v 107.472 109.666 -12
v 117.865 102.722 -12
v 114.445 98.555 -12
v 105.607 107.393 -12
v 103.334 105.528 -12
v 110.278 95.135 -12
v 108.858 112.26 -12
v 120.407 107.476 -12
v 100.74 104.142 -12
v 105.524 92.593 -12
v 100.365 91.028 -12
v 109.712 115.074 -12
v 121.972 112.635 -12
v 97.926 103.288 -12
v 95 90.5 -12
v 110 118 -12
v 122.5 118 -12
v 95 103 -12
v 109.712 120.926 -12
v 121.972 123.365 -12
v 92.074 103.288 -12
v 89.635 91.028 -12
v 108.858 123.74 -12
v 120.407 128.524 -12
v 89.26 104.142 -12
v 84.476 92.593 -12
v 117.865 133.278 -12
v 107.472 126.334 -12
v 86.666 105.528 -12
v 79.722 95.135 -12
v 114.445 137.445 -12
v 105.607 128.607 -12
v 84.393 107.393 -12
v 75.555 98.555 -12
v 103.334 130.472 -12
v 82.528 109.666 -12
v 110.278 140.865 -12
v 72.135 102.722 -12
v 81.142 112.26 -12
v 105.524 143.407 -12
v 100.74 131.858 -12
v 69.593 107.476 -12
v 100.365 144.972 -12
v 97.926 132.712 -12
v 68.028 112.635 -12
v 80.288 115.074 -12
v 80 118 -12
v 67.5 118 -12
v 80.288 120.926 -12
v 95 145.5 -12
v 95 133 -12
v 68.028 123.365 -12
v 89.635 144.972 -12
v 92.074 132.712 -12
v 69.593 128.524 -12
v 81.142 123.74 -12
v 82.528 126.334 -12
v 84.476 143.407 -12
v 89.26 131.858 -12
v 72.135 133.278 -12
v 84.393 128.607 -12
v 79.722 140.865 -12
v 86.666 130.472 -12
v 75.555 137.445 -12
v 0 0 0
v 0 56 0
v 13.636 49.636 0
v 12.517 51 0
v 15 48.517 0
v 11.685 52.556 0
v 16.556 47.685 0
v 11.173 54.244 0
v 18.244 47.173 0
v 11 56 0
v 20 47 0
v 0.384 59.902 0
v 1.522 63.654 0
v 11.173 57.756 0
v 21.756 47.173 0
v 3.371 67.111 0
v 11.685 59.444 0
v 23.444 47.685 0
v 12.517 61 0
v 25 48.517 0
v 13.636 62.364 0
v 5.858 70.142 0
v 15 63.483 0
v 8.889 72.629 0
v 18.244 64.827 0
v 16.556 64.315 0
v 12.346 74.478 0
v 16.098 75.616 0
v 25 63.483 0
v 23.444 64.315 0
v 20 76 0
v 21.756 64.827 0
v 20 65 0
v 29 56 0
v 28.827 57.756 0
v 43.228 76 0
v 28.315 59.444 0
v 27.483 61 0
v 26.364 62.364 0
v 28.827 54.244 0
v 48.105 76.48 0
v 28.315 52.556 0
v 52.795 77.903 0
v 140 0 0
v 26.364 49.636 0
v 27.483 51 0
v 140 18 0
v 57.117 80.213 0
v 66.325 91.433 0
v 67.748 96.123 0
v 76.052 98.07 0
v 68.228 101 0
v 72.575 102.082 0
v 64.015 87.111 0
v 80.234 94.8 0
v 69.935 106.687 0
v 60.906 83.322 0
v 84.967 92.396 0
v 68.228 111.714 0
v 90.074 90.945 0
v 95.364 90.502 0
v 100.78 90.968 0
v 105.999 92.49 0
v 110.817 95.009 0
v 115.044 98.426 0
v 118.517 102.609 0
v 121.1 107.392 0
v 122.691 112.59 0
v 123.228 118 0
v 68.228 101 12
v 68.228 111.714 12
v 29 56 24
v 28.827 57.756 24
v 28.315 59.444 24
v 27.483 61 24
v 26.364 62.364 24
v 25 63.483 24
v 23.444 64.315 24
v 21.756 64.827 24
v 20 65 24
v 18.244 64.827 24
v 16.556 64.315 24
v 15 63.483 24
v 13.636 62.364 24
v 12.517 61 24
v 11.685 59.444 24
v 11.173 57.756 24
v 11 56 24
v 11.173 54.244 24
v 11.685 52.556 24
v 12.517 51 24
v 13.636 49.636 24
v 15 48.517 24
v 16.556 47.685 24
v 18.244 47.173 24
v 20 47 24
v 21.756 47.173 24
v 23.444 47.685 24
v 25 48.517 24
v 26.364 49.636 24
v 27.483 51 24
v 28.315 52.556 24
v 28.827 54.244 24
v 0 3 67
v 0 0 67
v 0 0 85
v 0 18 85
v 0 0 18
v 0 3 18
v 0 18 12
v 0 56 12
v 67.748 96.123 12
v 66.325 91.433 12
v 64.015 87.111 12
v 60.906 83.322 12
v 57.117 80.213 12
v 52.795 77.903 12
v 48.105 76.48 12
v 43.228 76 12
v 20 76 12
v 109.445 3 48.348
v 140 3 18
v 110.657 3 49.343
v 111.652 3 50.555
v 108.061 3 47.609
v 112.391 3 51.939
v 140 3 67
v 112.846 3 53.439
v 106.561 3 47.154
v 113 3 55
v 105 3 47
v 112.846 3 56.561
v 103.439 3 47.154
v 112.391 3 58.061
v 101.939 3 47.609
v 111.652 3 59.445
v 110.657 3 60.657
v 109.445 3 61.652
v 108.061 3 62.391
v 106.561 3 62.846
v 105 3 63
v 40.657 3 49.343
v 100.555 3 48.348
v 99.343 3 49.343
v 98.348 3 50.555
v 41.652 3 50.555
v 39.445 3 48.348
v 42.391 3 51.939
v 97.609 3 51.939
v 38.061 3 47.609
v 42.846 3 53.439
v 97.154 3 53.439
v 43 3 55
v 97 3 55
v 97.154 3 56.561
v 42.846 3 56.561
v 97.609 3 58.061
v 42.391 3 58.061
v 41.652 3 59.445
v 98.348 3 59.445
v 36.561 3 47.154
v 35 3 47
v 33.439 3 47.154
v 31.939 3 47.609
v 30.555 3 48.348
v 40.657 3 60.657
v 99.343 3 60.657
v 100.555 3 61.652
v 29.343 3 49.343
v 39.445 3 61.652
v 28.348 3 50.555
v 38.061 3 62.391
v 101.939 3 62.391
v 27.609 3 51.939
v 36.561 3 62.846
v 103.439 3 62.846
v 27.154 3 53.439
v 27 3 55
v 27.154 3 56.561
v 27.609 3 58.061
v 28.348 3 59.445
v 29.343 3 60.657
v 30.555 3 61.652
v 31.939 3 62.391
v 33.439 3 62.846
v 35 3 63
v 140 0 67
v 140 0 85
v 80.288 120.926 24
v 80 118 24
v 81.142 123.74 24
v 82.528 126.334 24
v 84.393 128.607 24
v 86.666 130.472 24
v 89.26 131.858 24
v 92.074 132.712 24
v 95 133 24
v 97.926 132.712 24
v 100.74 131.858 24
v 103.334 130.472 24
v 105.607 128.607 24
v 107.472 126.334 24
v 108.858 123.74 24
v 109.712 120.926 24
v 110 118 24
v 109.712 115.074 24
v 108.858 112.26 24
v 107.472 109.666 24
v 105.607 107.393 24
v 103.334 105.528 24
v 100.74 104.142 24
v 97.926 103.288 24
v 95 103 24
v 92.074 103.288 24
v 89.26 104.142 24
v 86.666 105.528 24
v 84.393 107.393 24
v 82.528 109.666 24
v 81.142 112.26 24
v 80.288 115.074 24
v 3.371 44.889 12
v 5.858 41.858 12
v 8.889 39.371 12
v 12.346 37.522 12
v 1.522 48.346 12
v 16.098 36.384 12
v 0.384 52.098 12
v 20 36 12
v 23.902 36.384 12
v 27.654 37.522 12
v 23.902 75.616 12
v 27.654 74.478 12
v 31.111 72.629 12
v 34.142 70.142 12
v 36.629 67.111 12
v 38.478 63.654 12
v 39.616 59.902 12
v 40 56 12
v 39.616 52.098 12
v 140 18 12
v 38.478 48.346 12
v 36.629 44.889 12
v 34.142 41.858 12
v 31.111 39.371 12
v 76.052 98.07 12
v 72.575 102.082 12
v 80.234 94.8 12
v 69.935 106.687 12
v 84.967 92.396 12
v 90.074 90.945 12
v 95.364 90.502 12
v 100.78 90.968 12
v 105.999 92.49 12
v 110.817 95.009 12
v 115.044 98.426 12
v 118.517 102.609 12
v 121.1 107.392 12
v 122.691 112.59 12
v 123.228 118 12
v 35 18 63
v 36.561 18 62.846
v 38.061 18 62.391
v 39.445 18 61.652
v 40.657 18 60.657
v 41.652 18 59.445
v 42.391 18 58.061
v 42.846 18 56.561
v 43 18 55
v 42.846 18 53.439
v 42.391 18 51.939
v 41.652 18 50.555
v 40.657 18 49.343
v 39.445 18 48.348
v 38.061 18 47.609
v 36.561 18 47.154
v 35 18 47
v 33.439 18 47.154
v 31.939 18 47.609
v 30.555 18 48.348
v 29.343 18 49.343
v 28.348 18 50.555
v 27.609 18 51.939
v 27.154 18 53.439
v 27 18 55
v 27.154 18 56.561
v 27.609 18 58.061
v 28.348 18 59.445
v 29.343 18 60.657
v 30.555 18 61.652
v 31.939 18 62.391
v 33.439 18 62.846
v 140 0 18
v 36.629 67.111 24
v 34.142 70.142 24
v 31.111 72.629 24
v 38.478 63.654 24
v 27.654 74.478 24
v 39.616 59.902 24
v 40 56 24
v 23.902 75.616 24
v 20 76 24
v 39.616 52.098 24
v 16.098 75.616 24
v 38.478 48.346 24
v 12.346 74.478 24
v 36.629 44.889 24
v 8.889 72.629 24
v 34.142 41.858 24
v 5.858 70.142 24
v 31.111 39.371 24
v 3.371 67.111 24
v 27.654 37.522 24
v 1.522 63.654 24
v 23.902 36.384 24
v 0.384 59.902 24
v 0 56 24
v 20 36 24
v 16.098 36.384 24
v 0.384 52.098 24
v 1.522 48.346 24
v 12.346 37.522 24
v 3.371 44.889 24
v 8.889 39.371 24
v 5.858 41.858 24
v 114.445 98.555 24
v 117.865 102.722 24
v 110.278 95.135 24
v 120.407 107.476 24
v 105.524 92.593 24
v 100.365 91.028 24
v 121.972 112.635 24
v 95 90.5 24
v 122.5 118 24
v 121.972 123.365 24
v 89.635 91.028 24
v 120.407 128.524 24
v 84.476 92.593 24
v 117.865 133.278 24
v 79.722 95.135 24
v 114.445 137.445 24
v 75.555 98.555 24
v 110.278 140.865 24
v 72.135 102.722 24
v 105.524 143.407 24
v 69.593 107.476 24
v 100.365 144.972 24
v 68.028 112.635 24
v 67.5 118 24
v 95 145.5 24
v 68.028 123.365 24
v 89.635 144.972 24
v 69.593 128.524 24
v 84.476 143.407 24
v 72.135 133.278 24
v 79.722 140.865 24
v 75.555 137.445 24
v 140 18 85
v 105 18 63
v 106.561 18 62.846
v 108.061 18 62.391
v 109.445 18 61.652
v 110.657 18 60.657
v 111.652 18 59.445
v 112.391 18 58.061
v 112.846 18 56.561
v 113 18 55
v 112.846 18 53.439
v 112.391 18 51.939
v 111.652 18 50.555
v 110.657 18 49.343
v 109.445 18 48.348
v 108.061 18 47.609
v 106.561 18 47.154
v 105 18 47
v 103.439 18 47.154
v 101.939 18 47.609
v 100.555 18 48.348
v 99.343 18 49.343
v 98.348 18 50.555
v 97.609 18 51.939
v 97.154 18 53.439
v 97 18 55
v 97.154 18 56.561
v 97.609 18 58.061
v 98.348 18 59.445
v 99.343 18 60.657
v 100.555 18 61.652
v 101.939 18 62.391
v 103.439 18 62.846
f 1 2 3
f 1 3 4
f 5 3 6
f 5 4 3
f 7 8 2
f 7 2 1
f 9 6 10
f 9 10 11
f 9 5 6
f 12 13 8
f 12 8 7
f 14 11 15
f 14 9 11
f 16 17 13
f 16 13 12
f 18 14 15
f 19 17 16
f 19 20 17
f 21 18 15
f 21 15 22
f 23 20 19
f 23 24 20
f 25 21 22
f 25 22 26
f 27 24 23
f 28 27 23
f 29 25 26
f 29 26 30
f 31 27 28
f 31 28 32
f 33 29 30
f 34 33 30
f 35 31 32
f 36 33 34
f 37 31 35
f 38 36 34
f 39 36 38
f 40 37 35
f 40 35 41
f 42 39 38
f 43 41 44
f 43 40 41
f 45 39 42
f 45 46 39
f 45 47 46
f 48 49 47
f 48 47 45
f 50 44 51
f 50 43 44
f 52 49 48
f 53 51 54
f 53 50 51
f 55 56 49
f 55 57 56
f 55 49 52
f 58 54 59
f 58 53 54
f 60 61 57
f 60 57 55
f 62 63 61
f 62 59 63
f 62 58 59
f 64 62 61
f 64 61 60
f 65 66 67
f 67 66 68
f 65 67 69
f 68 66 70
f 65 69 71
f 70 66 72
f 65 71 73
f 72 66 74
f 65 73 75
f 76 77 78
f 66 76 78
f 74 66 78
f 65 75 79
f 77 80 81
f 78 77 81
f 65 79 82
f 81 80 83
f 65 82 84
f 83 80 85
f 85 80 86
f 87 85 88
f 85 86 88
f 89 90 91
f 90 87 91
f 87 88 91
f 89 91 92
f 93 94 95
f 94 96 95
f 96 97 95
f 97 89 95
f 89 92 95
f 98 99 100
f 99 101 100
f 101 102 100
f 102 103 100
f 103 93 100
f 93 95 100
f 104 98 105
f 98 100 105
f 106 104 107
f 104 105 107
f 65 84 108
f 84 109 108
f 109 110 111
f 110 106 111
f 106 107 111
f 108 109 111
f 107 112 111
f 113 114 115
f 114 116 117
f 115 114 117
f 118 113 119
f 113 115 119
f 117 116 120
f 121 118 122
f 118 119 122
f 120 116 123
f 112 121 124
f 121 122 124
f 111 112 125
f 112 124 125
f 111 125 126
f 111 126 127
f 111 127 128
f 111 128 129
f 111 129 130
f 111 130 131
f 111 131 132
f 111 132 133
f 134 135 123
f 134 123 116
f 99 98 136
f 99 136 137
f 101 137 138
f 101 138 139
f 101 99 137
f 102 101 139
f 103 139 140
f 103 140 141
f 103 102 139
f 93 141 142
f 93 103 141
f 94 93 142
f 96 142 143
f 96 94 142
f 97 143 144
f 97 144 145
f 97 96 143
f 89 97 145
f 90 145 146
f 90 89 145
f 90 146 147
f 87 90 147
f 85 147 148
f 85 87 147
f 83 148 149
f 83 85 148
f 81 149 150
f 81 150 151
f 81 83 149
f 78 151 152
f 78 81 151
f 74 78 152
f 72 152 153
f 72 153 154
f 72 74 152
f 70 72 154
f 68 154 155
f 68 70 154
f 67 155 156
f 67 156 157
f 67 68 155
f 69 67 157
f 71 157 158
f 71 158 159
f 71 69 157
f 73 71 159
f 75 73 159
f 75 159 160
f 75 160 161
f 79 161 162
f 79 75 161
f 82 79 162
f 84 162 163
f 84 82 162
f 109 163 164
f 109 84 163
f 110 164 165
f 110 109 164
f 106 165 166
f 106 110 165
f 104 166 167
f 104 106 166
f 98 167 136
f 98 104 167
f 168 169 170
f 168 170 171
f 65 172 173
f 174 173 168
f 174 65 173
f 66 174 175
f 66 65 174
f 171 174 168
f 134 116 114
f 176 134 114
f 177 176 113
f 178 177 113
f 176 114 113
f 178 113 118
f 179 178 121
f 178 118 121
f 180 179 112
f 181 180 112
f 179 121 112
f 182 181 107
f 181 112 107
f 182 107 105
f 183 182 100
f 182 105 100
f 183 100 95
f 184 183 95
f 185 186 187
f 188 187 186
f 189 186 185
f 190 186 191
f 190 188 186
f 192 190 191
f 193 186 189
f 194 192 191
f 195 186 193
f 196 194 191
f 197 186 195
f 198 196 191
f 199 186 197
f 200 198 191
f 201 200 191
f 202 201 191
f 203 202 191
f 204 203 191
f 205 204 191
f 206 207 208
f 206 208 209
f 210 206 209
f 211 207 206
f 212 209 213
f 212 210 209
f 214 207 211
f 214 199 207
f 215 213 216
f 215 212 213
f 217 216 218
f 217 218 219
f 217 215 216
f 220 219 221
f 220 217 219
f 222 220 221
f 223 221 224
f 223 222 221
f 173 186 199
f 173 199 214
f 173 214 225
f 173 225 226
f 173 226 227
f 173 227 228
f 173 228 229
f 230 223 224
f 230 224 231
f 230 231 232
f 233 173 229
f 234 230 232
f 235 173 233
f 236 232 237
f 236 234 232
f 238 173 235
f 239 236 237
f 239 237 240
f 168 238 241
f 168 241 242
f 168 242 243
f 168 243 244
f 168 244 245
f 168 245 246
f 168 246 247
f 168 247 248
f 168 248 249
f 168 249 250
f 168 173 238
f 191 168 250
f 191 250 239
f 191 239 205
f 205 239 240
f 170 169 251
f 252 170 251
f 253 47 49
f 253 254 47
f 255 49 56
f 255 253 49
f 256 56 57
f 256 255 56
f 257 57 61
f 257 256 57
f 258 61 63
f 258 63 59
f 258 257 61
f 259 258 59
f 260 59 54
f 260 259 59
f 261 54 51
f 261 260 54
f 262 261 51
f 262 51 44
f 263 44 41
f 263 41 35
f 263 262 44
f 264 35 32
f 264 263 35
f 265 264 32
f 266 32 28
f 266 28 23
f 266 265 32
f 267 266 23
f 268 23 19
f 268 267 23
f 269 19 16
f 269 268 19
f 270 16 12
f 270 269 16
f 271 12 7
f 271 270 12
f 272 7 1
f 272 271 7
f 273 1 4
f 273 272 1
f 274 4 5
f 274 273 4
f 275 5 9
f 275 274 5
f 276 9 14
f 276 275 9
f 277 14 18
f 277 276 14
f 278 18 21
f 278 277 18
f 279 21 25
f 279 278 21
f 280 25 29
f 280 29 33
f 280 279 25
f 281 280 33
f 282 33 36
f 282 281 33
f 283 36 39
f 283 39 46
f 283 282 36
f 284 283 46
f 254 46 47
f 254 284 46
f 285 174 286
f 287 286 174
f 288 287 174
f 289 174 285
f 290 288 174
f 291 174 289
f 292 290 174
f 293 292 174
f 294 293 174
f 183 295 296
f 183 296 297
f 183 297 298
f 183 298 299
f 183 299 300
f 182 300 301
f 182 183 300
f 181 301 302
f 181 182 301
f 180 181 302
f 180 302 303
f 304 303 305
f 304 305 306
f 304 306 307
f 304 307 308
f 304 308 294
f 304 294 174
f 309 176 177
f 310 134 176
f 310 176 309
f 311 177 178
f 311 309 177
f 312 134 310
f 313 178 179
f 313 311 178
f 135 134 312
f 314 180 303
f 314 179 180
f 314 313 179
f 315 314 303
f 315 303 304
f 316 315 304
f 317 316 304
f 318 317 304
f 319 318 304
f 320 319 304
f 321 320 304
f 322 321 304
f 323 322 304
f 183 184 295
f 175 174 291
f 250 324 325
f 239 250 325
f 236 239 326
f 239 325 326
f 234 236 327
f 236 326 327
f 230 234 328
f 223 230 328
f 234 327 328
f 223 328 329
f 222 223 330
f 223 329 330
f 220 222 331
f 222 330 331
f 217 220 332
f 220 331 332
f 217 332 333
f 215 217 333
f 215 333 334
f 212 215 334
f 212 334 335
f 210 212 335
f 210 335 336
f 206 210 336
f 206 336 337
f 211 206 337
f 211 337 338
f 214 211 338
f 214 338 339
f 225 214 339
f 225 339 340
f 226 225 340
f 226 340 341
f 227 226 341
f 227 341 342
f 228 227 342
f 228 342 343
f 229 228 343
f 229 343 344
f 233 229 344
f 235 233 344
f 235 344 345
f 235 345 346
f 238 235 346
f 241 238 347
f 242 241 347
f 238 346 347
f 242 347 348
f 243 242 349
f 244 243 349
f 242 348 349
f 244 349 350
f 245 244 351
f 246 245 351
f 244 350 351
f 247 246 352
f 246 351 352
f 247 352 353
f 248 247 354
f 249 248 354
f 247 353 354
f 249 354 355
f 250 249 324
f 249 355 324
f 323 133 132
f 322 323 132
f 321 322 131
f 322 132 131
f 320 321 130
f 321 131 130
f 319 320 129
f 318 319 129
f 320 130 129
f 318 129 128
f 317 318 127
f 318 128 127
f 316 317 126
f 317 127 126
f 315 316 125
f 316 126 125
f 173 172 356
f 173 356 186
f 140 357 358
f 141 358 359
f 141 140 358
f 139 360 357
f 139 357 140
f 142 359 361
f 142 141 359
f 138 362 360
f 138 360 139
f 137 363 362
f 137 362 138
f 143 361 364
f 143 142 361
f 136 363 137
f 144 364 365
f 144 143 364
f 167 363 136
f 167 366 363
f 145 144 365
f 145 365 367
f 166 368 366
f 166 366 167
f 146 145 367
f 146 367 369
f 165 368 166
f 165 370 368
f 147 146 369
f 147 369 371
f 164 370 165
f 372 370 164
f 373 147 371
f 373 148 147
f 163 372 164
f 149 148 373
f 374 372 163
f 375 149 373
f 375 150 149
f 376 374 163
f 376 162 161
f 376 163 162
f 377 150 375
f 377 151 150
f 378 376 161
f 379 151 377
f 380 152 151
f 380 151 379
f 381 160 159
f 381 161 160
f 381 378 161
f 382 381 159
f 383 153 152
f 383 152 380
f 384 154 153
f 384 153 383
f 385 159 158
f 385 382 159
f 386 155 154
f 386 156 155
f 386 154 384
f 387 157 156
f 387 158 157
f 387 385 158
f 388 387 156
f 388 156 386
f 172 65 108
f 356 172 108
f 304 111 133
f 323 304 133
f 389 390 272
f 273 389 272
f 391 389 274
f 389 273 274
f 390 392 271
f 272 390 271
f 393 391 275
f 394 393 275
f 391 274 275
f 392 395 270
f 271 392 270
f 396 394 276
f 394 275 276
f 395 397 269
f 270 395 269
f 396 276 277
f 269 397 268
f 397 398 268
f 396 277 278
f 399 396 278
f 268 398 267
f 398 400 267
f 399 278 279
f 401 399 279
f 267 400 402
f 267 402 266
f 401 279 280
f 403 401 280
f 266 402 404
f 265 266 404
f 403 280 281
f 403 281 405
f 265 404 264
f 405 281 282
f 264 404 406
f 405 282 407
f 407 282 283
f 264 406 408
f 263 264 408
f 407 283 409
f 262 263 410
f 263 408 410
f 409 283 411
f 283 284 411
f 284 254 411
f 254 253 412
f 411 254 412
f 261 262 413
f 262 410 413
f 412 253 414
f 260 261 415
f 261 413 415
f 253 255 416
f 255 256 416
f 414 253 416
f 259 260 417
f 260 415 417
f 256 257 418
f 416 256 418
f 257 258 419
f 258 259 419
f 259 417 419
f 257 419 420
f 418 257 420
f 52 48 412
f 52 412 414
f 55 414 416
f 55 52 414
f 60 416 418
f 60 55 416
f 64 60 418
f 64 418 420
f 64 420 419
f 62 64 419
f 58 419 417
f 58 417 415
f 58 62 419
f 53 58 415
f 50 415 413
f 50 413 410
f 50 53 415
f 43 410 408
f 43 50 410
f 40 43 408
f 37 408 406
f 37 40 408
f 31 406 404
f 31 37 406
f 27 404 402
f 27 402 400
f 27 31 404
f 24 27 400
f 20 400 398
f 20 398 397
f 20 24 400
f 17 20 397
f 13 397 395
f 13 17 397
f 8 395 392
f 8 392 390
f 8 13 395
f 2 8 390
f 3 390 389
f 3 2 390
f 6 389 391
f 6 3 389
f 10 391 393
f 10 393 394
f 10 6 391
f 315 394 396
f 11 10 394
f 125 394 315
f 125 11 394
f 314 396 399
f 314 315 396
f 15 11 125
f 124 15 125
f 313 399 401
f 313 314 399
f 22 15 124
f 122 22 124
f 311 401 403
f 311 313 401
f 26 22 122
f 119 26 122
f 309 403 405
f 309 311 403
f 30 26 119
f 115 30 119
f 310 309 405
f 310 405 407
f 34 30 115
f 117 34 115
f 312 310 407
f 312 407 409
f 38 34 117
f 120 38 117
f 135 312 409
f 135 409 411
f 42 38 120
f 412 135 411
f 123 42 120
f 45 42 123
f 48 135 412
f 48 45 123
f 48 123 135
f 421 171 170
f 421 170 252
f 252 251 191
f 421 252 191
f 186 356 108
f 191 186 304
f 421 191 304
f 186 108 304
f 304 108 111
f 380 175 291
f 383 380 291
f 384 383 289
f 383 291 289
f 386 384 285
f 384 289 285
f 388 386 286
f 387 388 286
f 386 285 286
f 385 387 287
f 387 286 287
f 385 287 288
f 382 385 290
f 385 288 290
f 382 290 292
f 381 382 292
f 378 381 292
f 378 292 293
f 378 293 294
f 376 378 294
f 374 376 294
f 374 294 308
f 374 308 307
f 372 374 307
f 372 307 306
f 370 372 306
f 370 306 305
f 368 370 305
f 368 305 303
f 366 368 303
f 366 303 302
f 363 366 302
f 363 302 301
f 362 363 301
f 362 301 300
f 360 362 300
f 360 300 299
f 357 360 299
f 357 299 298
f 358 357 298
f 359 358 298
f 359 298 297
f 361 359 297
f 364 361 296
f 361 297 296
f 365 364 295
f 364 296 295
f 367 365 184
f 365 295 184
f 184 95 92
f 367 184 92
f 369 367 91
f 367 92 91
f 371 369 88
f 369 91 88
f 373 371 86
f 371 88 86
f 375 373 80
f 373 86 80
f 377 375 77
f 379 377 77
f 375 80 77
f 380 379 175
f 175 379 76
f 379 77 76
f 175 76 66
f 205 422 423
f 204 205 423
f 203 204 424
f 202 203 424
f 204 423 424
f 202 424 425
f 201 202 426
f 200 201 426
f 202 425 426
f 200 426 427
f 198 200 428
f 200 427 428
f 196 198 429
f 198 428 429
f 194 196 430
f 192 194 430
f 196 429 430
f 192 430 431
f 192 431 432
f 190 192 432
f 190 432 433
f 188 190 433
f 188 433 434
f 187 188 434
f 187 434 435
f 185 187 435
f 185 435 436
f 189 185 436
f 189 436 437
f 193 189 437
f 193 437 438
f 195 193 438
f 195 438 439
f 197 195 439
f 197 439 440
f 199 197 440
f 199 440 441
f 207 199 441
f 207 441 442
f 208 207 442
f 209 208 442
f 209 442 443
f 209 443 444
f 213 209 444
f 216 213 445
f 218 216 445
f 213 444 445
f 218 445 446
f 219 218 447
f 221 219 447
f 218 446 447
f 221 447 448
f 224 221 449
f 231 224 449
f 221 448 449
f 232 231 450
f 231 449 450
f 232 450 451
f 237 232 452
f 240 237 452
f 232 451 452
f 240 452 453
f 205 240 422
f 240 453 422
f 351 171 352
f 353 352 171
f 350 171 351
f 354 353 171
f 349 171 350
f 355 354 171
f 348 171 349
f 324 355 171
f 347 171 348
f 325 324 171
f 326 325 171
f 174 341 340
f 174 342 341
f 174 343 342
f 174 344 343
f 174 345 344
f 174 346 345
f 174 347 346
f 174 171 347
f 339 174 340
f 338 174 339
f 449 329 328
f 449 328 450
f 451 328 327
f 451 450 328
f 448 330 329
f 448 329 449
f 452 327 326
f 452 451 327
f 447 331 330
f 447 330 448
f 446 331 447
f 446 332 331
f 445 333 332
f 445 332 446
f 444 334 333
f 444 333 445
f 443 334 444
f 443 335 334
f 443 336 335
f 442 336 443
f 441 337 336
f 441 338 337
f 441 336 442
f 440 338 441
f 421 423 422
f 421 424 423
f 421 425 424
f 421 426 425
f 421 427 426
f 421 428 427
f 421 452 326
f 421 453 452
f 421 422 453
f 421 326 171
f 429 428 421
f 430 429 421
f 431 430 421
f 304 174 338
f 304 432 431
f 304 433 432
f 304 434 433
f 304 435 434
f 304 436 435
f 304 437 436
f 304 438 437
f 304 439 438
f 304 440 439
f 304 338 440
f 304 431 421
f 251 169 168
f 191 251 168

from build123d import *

# Parameters (mm, degrees)
BOSS_EXTRUDE1_DEPTH = 12
SKETCH1_3_R         = 9
BOSS_EXTRUDE2_DEPTH = 24
SKETCH1_4_W         = 140
SKETCH1_4_H         = 18
BOSS_EXTRUDE3_DEPTH = 85
SKETCH2_R           = 27.5
SKETCH2_R_2         = 15
BOSS_EXTRUDE4_DEPTH = 18
SKETCH3_R           = 8
CUT_EXTRUDE1_DEPTH  = 208.560232222
SKETCH5_W           = 49
SKETCH5_H           = 3
CUT_EXTRUDE2_DEPTH  = 220.078182392


with BuildPart() as part:
    # Sketch1 → Boss-Extrude1 (new body)
    with BuildSketch(Plane.XY):
        with BuildLine():
            Line((140, 18), (123.22800697, 118))
            ThreePointArc((123.22800697, 118), (95.72800697, 90.5), (68.22800697, 118))
            Line((68.22800697, 118), (68.22800697, 101))
            ThreePointArc((68.22800697, 101), (60.9056765, 83.32233047), (43.22800697, 76))
            Line((43.22800697, 76), (20, 76))
            ThreePointArc((20, 76), (34.142135624, 70.142135624), (40, 56))
            ThreePointArc((40, 56), (20, 36), (0, 56))
            Line((0, 56), (0, 18))
            Line((0, 18), (140, 18))
        make_face()
    extrude(amount=BOSS_EXTRUDE1_DEPTH)

    # Sketch1<3> → Boss-Extrude2 (add)
    with BuildSketch(Plane.XY):
        with BuildLine():
            ThreePointArc((20, 76), (5.857864376, 70.142135624), (0, 56))
            ThreePointArc((0, 56), (20, 36), (40, 56))
            ThreePointArc((40, 56), (34.142135624, 70.142135624), (20, 76))
        make_face()
        with Locations((20, 56)):
            Circle(SKETCH1_3_R, mode=Mode.SUBTRACT)
    extrude(amount=BOSS_EXTRUDE2_DEPTH)

    # Sketch1<4> → Boss-Extrude3 (add)
    with BuildSketch(Plane.XY):
        with Locations((70, 9)):
            Rectangle(SKETCH1_4_W, SKETCH1_4_H)
    extrude(amount=BOSS_EXTRUDE3_DEPTH)

    # Sketch2 → Boss-Extrude4 (add, symmetric)
    with BuildSketch(Plane(origin=(0, 0, 6), x_dir=(-1, 0, 0), z_dir=(0, 0, -1))):
        with Locations((-95, 118)):
            Circle(SKETCH2_R)
        with Locations((-95, 118)):
            Circle(SKETCH2_R_2, mode=Mode.SUBTRACT)
    extrude(amount=BOSS_EXTRUDE4_DEPTH, both=True)

    # Sketch3 → Cut-Extrude1 (cut, through all)
    with BuildSketch(Plane(origin=(0, 18, 0), x_dir=(1, 0, 0), z_dir=(0, 1, 0))):
        with Locations((105, -55)):
            Circle(SKETCH3_R)
        with Locations((35, -55)):
            Circle(SKETCH3_R)
    extrude(amount=-CUT_EXTRUDE1_DEPTH, mode=Mode.SUBTRACT)

    # Sketch5 → Cut-Extrude2 (cut, through all)
    with BuildSketch(Plane.ZY):
        with Locations((42.5, 1.5)):
            Rectangle(SKETCH5_W, SKETCH5_H)
    extrude(amount=-CUT_EXTRUDE2_DEPTH, mode=Mode.SUBTRACT)


solid = part.part
